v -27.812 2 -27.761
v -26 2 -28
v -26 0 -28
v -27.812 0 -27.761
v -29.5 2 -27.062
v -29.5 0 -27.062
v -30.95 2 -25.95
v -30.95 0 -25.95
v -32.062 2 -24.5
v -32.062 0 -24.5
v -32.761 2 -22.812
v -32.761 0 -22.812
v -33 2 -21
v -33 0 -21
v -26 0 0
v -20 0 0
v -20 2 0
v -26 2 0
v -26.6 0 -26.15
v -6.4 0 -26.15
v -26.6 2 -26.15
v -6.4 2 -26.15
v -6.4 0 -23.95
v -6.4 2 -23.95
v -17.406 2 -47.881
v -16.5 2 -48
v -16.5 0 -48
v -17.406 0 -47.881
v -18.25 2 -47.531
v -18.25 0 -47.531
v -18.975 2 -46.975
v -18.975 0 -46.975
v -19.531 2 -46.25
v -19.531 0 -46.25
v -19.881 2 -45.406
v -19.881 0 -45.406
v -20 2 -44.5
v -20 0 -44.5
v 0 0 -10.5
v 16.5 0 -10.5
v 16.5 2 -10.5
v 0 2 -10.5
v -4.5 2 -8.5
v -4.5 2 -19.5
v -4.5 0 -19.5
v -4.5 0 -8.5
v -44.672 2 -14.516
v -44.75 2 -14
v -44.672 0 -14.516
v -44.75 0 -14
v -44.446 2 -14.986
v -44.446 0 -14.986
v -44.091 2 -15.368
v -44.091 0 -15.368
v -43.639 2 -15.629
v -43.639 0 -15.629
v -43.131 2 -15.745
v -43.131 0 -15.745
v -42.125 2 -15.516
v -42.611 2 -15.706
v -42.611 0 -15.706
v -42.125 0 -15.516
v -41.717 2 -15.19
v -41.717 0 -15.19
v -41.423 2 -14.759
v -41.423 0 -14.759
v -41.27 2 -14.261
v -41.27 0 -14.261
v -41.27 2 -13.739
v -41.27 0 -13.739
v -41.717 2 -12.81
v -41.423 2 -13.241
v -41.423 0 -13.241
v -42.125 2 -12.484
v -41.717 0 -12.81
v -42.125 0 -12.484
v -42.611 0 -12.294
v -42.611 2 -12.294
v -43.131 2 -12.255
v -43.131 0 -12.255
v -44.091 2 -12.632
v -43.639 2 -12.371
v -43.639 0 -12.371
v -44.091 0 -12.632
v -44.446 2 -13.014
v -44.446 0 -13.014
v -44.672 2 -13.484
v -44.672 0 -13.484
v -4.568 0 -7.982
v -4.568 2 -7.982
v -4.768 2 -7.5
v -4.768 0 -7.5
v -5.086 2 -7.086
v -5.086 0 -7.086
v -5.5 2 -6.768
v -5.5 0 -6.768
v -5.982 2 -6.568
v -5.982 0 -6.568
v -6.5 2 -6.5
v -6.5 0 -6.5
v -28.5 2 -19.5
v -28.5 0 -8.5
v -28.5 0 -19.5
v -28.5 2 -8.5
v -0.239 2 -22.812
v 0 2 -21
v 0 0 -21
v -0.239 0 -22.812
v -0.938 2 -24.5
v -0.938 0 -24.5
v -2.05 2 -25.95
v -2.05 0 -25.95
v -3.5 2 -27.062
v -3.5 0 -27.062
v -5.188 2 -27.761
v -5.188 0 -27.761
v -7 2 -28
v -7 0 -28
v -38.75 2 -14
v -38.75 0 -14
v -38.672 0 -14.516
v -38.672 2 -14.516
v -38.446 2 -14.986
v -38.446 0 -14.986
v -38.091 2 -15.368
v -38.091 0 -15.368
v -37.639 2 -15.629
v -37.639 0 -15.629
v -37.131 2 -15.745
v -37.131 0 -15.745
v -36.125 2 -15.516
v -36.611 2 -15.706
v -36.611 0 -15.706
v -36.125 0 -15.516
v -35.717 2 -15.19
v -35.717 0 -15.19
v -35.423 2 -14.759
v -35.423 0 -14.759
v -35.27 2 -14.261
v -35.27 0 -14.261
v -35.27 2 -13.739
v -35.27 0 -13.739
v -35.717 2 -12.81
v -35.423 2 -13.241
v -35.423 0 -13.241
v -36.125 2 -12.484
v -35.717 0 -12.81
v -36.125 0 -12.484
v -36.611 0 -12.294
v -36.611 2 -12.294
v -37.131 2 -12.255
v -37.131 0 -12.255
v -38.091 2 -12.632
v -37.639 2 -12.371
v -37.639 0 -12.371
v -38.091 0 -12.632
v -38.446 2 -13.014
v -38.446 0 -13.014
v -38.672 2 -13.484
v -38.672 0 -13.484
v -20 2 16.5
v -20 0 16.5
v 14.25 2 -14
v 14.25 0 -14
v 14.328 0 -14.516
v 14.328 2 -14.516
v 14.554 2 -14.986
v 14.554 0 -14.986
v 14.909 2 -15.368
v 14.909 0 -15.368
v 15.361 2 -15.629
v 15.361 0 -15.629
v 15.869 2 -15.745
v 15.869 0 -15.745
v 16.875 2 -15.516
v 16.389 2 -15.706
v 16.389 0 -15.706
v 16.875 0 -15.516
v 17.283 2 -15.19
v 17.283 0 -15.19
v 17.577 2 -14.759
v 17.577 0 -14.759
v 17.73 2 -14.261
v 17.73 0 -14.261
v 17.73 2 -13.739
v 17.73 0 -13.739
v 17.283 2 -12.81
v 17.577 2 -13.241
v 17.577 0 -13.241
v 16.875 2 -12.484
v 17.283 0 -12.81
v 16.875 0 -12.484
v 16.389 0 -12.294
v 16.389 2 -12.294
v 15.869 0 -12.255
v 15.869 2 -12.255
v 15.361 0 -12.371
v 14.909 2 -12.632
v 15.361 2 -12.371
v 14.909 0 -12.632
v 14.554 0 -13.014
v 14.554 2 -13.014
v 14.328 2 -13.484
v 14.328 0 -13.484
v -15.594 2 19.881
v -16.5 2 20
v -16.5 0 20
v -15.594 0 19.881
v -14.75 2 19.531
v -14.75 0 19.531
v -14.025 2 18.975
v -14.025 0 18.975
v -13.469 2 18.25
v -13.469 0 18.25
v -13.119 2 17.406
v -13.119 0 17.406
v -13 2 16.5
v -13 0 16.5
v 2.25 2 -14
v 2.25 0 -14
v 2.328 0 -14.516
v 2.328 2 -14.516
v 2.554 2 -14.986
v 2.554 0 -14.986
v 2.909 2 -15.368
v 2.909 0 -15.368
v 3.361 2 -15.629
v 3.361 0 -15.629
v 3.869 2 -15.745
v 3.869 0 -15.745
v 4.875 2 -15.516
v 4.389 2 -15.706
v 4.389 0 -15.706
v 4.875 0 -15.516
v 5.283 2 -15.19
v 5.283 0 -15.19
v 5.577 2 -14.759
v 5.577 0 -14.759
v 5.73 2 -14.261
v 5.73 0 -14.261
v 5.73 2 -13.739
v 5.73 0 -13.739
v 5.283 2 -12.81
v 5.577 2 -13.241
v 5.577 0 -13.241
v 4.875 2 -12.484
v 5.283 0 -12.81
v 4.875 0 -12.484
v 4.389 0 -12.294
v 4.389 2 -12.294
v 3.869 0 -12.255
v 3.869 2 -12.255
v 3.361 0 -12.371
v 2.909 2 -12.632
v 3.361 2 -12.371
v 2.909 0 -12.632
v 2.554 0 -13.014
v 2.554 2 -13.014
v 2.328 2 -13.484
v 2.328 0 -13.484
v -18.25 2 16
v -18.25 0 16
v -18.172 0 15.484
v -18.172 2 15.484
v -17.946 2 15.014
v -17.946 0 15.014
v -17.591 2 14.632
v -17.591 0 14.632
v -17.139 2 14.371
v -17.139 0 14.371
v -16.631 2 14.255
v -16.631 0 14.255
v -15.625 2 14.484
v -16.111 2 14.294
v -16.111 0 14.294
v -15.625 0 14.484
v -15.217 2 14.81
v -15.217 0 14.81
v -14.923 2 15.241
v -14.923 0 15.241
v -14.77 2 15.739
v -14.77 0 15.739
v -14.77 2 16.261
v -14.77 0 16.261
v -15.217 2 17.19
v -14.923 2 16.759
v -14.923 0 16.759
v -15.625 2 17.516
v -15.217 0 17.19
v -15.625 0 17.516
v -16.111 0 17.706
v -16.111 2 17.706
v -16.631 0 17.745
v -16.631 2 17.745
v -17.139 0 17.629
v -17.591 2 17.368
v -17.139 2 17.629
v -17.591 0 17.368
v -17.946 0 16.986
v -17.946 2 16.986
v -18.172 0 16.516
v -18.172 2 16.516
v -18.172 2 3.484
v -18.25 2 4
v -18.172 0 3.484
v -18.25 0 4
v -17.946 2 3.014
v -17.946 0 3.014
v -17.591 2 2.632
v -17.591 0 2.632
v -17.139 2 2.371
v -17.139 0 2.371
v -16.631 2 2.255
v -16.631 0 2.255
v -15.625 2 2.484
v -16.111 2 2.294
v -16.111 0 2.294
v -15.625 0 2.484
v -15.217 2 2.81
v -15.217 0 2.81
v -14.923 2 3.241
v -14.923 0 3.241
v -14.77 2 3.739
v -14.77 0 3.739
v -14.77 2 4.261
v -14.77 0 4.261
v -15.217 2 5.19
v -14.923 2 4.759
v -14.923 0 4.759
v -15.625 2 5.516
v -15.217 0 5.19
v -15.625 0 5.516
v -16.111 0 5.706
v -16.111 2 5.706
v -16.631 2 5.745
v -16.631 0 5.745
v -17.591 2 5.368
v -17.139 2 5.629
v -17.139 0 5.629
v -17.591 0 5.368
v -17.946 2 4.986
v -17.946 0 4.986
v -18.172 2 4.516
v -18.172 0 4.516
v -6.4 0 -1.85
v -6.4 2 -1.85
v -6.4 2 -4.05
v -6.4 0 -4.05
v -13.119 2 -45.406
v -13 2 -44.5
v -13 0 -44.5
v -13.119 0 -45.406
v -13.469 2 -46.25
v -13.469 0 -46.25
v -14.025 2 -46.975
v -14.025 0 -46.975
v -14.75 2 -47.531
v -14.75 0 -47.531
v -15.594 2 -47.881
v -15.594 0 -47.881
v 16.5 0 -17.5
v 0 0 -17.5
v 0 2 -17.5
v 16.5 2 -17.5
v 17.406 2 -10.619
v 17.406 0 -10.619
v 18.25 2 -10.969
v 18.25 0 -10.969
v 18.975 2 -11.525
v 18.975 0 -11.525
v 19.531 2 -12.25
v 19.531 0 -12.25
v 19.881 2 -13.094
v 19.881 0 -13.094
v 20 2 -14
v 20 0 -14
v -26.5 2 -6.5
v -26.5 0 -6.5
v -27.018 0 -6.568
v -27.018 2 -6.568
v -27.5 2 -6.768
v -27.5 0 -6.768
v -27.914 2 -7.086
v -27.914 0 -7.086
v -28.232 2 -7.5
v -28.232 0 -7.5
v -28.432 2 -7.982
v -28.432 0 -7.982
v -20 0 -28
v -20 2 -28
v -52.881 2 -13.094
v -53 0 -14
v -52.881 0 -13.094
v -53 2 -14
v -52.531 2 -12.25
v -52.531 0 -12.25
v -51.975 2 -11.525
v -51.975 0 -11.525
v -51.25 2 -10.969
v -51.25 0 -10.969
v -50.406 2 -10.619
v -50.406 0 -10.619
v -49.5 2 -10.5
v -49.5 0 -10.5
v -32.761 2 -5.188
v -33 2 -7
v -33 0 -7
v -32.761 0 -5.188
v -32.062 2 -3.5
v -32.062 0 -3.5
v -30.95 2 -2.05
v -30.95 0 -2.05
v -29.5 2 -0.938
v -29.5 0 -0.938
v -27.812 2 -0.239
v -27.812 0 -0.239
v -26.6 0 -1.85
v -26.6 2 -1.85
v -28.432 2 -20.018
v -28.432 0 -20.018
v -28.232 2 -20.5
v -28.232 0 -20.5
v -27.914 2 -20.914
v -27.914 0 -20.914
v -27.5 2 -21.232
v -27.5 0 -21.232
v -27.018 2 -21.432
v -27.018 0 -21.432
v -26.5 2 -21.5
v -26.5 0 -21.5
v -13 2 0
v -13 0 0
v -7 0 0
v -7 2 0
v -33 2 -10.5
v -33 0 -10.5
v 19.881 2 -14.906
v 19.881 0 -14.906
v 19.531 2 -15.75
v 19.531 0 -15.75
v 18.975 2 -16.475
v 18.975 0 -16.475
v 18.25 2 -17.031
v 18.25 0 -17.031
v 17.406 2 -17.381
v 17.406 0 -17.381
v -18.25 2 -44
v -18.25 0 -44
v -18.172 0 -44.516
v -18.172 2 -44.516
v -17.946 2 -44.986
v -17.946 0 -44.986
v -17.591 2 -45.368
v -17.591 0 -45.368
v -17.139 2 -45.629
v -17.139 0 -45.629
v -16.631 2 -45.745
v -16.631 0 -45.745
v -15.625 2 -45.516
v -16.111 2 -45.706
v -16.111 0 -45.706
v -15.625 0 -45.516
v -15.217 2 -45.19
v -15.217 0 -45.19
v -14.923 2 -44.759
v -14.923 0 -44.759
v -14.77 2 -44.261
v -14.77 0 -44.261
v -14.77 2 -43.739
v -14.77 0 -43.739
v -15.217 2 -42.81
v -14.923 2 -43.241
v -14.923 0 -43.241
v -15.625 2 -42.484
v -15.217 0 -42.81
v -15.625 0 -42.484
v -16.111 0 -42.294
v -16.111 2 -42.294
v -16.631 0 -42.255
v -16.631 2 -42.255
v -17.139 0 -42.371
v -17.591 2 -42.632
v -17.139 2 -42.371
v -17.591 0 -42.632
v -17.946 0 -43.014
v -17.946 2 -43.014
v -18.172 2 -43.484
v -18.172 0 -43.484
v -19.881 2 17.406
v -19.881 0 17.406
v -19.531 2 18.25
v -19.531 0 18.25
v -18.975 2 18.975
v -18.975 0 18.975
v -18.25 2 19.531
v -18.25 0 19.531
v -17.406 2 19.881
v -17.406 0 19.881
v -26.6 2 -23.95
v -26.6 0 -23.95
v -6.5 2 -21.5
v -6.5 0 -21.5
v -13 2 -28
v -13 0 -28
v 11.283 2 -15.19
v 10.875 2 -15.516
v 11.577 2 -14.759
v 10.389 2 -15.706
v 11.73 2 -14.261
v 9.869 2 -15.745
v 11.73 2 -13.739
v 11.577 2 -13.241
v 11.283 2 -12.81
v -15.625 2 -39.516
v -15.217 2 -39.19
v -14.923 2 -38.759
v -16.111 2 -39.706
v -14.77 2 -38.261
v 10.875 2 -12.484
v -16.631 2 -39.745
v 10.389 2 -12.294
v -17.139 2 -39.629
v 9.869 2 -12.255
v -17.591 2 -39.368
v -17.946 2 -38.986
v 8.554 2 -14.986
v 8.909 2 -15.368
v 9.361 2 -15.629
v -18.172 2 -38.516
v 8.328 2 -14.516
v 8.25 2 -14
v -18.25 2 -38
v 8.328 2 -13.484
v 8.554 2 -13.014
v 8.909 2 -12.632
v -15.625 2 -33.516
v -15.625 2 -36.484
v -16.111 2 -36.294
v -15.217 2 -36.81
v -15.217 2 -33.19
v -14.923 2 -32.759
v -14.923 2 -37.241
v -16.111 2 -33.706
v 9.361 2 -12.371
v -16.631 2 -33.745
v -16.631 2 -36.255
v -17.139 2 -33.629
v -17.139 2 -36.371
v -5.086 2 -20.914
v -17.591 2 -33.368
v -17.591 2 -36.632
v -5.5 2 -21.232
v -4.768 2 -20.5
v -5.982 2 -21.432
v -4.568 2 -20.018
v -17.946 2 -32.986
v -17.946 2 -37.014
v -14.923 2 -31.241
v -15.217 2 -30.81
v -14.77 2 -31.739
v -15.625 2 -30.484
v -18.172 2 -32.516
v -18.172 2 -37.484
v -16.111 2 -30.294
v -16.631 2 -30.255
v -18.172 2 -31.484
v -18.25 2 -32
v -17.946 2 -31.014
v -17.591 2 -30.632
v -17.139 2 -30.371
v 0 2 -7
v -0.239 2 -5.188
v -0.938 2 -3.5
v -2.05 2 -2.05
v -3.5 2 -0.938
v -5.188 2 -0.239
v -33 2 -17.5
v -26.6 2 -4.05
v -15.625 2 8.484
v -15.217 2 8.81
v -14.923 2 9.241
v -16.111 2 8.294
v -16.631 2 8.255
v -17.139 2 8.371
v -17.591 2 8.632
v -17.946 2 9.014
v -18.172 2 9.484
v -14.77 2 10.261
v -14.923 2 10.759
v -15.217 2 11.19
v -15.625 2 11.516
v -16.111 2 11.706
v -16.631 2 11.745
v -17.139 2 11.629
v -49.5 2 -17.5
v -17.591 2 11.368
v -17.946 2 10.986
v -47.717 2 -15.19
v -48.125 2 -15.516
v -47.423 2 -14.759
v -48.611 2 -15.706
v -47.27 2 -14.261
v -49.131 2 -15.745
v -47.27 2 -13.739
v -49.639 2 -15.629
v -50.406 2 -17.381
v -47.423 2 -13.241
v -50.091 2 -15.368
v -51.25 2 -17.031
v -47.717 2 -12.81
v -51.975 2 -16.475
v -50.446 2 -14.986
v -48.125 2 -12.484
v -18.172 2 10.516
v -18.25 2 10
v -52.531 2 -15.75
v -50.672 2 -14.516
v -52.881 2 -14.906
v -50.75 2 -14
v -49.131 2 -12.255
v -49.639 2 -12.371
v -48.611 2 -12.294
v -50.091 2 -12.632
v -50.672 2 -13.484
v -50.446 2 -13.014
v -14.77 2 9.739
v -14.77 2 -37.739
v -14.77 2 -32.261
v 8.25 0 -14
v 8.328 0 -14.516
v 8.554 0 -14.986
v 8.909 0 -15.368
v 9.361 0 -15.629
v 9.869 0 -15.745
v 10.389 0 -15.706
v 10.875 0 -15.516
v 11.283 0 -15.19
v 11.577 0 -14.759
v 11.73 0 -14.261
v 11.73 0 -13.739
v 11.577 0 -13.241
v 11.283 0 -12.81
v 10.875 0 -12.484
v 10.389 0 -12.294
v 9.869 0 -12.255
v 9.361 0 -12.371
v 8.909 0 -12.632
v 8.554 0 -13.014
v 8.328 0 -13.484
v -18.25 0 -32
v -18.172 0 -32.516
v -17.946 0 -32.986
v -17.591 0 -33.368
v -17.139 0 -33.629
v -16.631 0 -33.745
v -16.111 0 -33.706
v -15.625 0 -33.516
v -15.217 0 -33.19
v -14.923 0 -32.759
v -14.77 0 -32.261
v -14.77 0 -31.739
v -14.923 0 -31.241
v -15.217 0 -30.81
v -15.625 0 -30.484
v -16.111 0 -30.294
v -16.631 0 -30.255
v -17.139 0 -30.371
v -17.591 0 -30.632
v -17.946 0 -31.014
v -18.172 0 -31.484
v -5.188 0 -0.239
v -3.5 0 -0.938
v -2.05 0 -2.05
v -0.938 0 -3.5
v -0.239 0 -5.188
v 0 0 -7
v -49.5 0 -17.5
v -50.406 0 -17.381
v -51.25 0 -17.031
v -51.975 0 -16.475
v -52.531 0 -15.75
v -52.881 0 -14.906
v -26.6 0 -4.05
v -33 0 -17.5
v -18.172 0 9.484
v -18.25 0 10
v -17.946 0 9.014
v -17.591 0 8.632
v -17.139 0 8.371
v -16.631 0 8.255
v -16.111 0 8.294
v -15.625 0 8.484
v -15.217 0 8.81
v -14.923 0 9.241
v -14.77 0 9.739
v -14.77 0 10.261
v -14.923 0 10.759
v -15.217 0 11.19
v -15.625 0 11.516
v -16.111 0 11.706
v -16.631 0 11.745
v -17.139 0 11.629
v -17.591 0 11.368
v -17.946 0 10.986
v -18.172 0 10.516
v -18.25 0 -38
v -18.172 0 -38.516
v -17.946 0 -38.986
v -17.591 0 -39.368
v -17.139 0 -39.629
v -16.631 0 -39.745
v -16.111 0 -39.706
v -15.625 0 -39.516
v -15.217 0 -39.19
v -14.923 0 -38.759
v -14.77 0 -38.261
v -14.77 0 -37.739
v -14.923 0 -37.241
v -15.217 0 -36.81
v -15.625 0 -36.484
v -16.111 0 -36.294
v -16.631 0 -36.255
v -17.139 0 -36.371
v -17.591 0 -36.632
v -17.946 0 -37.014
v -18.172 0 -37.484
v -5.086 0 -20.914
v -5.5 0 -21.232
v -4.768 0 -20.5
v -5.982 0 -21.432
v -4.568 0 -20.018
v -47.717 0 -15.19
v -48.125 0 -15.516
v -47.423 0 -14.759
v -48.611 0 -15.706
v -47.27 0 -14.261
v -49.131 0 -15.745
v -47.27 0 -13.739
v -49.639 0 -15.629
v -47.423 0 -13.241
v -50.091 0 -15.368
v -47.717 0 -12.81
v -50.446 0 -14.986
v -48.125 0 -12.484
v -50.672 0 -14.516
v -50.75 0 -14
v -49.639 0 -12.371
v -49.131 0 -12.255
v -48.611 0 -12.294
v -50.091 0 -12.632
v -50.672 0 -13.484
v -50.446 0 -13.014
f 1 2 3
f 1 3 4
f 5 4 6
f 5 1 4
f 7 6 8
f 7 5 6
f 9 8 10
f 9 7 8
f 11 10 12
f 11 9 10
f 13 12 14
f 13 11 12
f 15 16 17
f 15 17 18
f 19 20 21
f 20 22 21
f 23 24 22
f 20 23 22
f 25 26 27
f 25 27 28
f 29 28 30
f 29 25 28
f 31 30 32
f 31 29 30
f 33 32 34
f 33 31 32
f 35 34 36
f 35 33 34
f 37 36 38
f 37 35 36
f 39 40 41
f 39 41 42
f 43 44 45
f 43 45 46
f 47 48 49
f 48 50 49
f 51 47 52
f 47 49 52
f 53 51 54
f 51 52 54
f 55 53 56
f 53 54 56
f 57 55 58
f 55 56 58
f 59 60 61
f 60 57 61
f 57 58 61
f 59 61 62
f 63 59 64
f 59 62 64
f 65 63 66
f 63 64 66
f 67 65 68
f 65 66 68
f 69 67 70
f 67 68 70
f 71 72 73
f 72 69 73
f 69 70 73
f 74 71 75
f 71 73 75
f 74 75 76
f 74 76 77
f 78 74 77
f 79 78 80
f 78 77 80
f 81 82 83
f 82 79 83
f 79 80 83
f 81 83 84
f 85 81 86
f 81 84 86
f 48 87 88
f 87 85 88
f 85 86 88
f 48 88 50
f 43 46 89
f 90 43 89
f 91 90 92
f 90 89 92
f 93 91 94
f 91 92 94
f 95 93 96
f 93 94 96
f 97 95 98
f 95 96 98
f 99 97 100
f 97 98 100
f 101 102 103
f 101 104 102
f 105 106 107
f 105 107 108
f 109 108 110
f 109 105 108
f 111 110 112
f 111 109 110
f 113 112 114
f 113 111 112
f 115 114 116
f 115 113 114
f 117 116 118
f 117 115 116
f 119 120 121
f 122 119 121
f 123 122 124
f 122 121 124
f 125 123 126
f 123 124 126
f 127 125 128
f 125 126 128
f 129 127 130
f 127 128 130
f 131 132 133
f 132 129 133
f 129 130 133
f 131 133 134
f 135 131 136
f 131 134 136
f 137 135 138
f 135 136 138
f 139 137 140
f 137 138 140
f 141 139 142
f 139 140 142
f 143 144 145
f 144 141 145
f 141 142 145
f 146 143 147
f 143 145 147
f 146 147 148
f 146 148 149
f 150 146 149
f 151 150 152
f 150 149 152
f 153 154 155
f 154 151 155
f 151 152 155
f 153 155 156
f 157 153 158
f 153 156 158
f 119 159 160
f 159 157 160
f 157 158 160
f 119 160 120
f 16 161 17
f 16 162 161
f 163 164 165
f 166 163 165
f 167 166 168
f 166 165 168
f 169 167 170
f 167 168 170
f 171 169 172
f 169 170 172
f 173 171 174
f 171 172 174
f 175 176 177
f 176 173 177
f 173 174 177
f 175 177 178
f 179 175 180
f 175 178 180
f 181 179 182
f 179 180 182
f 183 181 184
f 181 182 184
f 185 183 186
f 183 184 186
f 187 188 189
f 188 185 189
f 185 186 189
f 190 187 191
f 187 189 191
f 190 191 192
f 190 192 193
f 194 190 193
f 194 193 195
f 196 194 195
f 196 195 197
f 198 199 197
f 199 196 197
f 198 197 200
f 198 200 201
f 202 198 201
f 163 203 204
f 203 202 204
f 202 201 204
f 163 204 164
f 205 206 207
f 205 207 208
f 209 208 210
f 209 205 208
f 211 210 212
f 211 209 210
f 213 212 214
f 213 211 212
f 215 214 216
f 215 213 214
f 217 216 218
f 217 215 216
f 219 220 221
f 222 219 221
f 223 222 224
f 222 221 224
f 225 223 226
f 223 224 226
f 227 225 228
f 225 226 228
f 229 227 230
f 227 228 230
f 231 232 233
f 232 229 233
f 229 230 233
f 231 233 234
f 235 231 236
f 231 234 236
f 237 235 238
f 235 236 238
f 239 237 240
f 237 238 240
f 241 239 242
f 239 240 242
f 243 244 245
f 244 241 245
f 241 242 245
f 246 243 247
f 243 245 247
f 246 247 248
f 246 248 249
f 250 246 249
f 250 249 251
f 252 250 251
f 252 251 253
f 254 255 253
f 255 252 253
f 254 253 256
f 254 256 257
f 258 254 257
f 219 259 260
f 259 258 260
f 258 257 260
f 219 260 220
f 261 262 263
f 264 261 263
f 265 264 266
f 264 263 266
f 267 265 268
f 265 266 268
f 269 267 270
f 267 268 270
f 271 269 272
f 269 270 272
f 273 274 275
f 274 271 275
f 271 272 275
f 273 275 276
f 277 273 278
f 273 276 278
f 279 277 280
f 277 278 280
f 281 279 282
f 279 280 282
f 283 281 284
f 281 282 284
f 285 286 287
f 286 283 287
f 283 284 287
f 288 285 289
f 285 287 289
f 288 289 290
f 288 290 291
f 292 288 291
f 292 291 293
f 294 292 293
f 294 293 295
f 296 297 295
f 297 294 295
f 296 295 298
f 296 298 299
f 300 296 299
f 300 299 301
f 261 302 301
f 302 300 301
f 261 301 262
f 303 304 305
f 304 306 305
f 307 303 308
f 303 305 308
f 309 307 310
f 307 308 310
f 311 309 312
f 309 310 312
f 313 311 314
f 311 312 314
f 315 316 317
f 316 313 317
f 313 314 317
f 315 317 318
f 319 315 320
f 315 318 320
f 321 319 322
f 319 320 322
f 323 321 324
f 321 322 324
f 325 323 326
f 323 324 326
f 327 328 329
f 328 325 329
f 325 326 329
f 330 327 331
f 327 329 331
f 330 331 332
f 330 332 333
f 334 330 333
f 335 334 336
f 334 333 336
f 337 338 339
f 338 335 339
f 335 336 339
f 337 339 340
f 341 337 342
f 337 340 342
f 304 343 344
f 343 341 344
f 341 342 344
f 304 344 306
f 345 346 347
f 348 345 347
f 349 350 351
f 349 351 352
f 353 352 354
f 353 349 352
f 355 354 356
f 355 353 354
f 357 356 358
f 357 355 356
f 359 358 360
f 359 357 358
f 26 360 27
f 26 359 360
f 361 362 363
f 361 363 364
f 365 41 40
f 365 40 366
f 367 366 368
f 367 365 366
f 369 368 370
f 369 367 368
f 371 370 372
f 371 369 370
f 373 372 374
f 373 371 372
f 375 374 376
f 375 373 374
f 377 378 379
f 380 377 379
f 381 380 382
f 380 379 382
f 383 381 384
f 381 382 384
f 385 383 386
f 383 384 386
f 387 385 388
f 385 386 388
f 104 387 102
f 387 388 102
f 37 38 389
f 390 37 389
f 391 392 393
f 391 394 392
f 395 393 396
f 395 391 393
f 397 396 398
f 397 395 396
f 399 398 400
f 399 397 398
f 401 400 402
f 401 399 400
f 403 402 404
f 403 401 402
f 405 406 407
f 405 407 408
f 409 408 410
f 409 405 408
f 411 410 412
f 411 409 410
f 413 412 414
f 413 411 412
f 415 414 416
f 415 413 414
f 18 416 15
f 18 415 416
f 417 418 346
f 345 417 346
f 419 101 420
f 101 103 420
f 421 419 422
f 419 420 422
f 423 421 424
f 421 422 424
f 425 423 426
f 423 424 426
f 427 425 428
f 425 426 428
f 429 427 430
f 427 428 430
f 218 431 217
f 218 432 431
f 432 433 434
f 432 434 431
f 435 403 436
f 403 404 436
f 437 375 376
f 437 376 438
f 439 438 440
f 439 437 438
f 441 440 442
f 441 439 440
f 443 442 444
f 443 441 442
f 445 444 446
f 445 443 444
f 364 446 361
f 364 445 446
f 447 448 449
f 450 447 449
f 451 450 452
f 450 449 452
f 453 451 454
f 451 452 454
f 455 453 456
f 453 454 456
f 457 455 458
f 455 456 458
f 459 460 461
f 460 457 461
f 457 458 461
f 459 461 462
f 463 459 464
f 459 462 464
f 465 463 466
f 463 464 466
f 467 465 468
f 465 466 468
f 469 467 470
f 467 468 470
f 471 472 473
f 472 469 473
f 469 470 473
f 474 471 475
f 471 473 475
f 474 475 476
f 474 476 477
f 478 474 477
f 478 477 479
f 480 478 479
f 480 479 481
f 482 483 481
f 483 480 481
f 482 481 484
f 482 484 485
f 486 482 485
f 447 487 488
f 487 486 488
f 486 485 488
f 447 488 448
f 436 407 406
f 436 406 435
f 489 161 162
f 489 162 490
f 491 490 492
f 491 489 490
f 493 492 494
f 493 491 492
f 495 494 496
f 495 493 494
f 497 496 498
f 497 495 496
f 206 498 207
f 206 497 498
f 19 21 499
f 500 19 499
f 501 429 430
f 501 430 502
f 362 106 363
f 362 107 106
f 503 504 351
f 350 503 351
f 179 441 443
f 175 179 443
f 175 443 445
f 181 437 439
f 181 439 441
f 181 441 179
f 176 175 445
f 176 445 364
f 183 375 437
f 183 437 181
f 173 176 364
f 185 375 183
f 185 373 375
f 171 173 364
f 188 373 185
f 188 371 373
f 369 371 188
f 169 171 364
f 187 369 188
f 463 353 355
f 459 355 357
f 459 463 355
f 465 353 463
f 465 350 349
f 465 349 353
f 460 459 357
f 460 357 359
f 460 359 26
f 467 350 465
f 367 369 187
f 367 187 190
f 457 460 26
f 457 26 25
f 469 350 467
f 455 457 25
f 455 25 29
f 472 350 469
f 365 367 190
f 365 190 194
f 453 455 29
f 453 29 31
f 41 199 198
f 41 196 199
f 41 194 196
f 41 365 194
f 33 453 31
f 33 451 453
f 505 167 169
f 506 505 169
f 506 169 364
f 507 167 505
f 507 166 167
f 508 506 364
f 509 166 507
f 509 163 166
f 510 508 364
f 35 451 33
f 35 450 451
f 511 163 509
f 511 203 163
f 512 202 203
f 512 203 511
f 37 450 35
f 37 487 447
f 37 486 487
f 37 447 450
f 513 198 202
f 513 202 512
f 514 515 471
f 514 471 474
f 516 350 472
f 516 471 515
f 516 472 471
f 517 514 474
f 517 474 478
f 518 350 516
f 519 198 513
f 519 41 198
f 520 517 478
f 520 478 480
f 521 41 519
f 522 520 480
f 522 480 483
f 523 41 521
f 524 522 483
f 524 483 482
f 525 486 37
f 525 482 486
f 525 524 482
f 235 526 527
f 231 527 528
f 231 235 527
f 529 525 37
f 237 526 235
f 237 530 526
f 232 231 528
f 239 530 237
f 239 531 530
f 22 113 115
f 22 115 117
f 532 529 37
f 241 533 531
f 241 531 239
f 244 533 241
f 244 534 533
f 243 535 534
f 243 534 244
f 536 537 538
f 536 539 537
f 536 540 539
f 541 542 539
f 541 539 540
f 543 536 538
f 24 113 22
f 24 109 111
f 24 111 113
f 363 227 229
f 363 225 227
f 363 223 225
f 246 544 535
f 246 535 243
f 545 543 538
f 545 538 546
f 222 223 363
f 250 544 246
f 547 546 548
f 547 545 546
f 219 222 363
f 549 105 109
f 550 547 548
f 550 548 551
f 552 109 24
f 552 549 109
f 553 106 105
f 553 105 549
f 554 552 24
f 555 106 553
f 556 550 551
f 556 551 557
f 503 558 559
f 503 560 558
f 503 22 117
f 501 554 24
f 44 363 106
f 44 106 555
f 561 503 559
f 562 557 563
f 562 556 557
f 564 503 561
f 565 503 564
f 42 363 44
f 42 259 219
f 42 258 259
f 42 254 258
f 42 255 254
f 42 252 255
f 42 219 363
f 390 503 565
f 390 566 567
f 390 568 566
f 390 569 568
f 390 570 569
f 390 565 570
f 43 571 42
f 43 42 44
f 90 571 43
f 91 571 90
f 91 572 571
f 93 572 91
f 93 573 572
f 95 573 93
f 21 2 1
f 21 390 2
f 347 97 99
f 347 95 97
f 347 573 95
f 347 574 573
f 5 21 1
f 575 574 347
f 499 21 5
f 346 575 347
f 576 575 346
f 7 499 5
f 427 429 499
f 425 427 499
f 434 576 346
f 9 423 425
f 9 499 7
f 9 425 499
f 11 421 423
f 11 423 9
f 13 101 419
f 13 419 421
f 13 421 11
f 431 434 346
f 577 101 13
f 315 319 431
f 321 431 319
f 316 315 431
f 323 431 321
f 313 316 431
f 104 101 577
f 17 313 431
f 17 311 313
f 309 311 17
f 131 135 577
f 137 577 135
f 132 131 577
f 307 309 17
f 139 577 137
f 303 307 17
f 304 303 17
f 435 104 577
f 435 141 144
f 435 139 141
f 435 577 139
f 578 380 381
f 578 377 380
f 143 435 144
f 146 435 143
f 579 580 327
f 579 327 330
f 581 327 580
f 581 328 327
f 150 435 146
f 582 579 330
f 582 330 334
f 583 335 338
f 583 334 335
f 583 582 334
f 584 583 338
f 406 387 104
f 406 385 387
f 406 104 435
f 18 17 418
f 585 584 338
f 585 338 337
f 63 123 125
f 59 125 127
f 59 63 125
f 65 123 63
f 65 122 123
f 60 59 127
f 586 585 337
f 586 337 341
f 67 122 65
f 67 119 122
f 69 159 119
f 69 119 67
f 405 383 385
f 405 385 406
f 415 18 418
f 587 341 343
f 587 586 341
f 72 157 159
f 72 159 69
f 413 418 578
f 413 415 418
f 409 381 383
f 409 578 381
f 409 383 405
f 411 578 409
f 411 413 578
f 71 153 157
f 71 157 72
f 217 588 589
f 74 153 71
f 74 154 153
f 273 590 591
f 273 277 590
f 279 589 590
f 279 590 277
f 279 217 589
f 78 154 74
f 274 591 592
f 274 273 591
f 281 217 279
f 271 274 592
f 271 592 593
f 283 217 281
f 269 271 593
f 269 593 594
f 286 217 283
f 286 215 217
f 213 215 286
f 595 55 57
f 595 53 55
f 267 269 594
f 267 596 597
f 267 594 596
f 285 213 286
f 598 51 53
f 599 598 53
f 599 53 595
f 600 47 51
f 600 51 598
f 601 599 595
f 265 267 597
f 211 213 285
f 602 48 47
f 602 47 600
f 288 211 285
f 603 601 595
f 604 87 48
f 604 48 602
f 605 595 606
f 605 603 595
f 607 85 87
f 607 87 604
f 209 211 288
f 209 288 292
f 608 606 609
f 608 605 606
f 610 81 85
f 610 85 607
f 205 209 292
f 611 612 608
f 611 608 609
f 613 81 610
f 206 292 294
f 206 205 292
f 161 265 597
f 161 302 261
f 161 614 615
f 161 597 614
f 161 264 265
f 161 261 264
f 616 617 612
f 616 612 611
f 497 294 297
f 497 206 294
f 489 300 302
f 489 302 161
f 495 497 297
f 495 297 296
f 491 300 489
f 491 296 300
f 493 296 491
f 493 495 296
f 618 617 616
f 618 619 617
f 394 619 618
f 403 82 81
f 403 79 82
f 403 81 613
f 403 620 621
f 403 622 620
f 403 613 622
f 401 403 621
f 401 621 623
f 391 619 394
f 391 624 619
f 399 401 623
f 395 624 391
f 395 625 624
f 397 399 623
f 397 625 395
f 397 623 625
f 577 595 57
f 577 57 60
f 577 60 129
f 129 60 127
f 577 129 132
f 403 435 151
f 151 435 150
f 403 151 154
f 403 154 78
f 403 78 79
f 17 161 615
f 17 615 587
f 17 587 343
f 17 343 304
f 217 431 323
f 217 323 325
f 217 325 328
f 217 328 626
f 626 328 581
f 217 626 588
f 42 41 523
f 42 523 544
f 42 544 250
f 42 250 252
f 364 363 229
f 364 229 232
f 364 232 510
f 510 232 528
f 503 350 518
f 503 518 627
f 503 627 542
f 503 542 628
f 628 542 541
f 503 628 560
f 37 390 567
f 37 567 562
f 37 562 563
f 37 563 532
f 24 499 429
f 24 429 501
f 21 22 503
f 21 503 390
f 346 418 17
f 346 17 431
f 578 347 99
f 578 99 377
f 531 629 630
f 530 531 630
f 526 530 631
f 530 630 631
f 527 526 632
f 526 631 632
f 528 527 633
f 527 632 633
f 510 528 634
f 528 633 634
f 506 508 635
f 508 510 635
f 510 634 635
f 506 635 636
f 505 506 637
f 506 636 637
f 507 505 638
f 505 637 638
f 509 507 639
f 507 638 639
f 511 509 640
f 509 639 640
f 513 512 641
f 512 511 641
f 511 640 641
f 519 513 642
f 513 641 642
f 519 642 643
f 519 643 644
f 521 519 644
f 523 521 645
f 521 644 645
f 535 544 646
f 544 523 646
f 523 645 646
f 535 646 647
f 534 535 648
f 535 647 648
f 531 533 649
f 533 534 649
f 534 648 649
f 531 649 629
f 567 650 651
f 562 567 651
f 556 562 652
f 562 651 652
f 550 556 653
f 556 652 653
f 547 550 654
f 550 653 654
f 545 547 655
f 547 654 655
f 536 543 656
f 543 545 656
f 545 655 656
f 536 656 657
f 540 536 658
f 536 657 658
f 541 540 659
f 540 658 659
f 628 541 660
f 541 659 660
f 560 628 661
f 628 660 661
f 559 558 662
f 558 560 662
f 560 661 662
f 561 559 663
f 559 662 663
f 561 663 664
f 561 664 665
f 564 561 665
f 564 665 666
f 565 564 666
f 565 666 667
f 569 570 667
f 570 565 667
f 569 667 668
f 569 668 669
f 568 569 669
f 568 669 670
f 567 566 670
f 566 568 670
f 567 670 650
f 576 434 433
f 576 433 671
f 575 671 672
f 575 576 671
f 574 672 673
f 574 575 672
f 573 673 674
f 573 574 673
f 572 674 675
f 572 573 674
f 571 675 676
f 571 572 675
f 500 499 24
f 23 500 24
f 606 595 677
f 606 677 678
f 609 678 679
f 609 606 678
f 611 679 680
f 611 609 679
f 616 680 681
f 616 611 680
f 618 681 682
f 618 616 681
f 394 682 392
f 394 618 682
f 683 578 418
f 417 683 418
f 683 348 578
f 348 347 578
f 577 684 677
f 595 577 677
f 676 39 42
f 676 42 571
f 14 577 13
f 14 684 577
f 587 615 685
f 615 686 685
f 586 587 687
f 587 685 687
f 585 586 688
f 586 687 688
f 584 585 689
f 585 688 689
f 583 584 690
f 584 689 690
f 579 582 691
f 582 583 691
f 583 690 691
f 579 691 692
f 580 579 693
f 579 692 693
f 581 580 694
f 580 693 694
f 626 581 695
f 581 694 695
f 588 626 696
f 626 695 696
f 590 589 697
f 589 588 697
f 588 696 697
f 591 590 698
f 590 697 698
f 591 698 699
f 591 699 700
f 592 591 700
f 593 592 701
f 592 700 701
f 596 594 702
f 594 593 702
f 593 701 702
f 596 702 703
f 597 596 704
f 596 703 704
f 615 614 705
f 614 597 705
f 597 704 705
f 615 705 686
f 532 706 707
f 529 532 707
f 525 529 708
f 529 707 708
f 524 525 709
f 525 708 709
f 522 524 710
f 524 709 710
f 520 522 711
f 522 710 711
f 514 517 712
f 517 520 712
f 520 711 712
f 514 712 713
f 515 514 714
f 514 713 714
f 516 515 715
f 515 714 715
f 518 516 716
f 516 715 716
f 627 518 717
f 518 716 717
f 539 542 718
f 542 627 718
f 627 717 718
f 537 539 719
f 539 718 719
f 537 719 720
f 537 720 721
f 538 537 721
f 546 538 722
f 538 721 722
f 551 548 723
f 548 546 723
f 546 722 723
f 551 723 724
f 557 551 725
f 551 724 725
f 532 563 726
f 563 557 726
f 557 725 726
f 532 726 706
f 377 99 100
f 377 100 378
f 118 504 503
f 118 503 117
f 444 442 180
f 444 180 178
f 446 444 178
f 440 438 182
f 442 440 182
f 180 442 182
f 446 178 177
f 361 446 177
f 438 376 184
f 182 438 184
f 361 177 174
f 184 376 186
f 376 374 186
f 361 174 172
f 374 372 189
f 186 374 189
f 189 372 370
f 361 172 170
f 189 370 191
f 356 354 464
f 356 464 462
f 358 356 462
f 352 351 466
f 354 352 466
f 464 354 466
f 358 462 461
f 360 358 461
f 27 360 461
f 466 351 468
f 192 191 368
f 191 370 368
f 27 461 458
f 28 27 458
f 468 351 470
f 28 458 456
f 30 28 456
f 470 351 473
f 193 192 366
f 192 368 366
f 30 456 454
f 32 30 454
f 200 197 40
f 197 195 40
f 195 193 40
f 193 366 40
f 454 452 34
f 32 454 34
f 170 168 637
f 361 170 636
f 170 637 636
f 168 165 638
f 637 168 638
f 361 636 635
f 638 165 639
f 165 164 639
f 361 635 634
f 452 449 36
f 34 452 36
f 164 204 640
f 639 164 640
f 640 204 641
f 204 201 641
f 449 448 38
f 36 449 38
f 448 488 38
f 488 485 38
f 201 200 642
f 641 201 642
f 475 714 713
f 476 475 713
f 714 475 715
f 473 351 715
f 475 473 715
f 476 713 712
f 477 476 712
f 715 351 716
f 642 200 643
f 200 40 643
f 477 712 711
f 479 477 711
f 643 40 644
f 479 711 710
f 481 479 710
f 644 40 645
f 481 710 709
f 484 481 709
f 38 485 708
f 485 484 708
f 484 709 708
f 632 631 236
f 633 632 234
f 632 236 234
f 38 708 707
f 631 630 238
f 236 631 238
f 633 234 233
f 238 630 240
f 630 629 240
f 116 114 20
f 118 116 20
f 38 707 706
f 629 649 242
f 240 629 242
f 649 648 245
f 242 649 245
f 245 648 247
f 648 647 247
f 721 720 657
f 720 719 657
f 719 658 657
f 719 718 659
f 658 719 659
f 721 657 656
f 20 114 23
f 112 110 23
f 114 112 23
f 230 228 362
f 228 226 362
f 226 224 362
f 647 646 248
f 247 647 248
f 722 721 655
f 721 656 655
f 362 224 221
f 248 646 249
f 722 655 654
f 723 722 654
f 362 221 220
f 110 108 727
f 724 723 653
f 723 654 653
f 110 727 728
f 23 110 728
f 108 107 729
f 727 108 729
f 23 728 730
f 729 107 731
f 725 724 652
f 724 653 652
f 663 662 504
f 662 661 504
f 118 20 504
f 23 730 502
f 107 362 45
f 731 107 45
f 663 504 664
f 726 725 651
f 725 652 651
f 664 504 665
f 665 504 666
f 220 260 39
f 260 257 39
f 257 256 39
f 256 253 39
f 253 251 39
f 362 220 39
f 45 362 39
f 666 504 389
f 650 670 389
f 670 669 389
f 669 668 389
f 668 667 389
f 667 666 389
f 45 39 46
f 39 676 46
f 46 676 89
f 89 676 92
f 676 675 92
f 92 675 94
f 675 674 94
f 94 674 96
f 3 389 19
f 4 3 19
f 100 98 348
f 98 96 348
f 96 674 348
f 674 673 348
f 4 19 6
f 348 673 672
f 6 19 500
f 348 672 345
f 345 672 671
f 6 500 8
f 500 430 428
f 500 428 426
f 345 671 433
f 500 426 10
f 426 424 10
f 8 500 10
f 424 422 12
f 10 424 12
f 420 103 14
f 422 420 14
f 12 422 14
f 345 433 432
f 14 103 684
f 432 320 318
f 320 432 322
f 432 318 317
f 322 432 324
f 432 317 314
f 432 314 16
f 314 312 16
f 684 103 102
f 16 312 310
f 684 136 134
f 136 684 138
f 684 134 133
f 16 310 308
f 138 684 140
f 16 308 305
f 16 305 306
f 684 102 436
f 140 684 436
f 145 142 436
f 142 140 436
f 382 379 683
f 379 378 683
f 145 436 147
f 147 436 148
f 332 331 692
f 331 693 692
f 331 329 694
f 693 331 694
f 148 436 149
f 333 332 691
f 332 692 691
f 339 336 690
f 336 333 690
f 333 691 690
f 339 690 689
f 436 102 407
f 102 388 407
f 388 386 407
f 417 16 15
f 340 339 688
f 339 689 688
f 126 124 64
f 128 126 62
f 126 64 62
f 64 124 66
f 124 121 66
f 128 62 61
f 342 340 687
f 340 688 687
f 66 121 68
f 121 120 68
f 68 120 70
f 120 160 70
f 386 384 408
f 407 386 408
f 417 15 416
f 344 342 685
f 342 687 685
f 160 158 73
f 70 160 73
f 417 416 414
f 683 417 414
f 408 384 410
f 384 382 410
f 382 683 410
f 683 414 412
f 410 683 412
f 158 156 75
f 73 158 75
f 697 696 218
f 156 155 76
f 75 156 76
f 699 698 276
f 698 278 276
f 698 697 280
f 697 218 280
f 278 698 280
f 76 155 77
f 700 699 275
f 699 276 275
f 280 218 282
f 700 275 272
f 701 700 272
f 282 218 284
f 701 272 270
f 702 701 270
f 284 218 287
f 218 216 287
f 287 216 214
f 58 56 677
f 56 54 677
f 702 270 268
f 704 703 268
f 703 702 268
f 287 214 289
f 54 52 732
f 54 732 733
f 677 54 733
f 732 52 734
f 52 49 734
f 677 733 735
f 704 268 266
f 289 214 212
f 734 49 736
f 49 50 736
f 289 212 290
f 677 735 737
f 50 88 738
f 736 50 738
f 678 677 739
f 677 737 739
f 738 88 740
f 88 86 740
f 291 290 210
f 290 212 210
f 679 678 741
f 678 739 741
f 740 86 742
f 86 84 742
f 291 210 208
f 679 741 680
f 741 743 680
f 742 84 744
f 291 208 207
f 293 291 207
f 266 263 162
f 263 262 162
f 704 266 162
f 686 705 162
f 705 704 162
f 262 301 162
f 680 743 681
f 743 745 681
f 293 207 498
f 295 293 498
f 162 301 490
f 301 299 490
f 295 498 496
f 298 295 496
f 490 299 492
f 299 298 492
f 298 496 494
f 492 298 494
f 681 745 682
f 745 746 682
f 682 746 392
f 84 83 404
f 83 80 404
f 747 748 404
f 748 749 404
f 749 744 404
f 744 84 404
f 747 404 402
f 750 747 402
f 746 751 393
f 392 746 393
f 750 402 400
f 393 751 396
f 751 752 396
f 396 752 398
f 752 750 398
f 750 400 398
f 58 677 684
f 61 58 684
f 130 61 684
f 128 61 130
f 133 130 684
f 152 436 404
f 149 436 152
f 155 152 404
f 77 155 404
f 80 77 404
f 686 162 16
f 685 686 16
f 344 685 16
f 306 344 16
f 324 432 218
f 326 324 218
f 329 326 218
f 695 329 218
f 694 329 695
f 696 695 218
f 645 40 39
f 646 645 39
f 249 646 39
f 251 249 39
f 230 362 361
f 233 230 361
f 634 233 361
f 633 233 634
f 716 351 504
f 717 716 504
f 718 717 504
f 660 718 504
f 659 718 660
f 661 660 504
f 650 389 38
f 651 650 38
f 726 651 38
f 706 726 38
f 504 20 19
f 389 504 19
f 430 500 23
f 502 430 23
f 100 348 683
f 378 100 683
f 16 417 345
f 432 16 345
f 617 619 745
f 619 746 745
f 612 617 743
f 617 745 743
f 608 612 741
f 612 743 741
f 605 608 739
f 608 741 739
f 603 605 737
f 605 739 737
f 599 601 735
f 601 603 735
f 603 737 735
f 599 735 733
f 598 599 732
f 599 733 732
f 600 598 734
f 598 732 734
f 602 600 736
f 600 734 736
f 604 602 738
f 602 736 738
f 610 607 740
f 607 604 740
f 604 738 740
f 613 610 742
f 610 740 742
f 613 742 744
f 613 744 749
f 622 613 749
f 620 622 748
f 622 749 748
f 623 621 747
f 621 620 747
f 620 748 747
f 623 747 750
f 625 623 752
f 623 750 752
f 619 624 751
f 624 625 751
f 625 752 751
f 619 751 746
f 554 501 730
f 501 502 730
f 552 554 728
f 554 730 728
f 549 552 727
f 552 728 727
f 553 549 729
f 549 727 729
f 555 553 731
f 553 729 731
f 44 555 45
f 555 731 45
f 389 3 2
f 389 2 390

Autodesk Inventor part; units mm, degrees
ref_plane "YZ Plane" through (0, 0, 0) normal (1, 0, 0) x (0, 1, 0)
ref_plane "XZ Plane" through (0, 0, 0) normal (0, 1, 0) x (-1, 0, 0)
ref_plane "XY Plane" through (0, 0, 0) normal (0, 0, 1) x (1, 0, 0)
sketch "Sketch1" plane through (0, 0, 0) normal (0, 1, 0) x (-1, 0, 0)
  line L0 (0, 0) -> (33, 0)
  line L1 (33, 0) -> (33, -28)
  line L2 (33, -28) -> (0, -28)
  line L3 (0, -28) -> (0, 0)
  line L4 (0, -17.5) -> (-20, -17.5)
  line L5 (-20, -17.5) -> (-20, -10.5)
  line L6 (-20, -10.5) -> (0, -10.5)
  line L7 (0, -10.5) -> (0, -17.5)
  line L8 (33, -17.5) -> (53, -17.5)
  line L9 (53, -17.5) -> (53, -10.5)
  line L10 (53, -10.5) -> (33, -10.5)
  line L11 (33, -10.5) -> (33, -17.5)
  line L12 (20, -28) -> (13, -28)
  line L13 (13, -28) -> (13, -48)
  line L14 (13, -48) -> (20, -48)
  line L15 (20, -48) -> (20, -28)
  line L16 (20, 0) -> (13, 0)
  line L17 (13, 0) -> (13, 20)
  line L18 (13, 20) -> (20, 20)
  line L19 (20, 20) -> (20, 0)
  circle A0 centre (16.5, -44) radius 1.75
  circle A1 centre (-16, -14) radius 1.75
  circle A2 centre (16.5, 16) radius 1.75
  circle A3 centre (49, -14) radius 1.75
  line L20 (16.5, -44) -> (16.5, -48) construction
  line L21 (-16, -14) -> (-20, -14) construction
  line L22 (16.5, 16) -> (16.5, 20) construction
  line L23 (49, -14) -> (53, -14) construction
  circle A4 centre (43, -14) radius 1.75
  circle A5 centre (37, -14) radius 1.75
  circle A6 centre (16.5, -38) radius 1.75
  circle A7 centre (16.5, -32) radius 1.75
  circle A8 centre (-10, -14) radius 1.75
  circle A9 centre (-4, -14) radius 1.75
  circle A10 centre (16.5, 10) radius 1.75
  circle A11 centre (16.5, 4) radius 1.75
  point P0 (16.5, -28)
  point P1 (16.5, 0)
  point P2 (0, -14)
  point P3 (33, -14)
  dimension "d0" = 33
  dimension "d1" = 28
  dimension "d29" = 7
  dimension "d34" = 20
  dimension "d35" = 4
  dimension "d36" = 3.5
  dimension "d44" = 6
  dimension "d51" = 6
  dimension "d58" = 6
  dimension "d65" = 6
extrude "Extrusion1" add sketch "Sketch1" along normal blind 2
sketch "Sketch2" plane through (0, 2, 0) normal (0, 1, 0) x (1, 0, 0)
  line L0 (0, 28) -> (-13, 28) projected
  line L1 (-33, 28) -> (-33, 17.5) projected
  line L2 (-33, 0) -> (-20, 0) projected
  line L3 (0, 0) -> (0, 10.5) projected
  line L4 (-26.6, 1.85) -> (-6.4, 1.85)
  line L5 (-6.4, 1.85) -> (-6.4, 4.05)
  line L6 (-6.4, 4.05) -> (-26.6, 4.05)
  line L7 (-26.6, 4.05) -> (-26.6, 1.85)
  line L8 (-26.6, 23.95) -> (-6.4, 23.95)
  line L9 (-6.4, 23.95) -> (-6.4, 26.15)
  line L10 (-6.4, 26.15) -> (-26.6, 26.15)
  line L11 (-26.6, 26.15) -> (-26.6, 23.95)
  line L12 (-26.6, 1.85) -> (-33, 1.85)
  line L13 (-26.6, 1.85) -> (-26.6, 0)
  line L14 (-26.6, 26.15) -> (-26.6, 28)
  line L15 (-6.4, 4.05) -> (0, 4.05)
  line L16 (-13, 28) -> (-13, 48) projected
  line L17 (-13, 48) -> (-20, 48) projected
  line L18 (-20, 48) -> (-20, 28) projected
  line L19 (-20, 28) -> (-33, 28) projected
  line L20 (-33, 17.5) -> (-53, 17.5) projected
  line L21 (-53, 17.5) -> (-53, 10.5) projected
  line L22 (-53, 10.5) -> (-33, 10.5) projected
  line L23 (-33, 10.5) -> (-33, 0) projected
  line L24 (-20, 0) -> (-20, -20) projected
  line L25 (-20, -20) -> (-13, -20) projected
  line L26 (-13, -20) -> (-13, 0) projected
  line L27 (-13, 0) -> (0, 0) projected
  line L28 (0, 10.5) -> (20, 10.5) projected
  line L29 (20, 10.5) -> (20, 17.5) projected
  line L30 (20, 17.5) -> (0, 17.5) projected
  line L31 (0, 17.5) -> (0, 28) projected
  line L32 (-28.5, 21.5) -> (-4.5, 21.5)
  line L33 (-4.5, 21.5) -> (-4.5, 6.5)
  line L34 (-4.5, 6.5) -> (-28.5, 6.5)
  line L35 (-28.5, 6.5) -> (-28.5, 21.5)
  line L36 (-28.5, 21.5) -> (-4.5, 6.5) construction
  line L37 (-4.5, 21.5) -> (-28.5, 6.5) construction
  point P0 (-16.5, 14)
  point P1 (-16.5, 23.95)
  point P2 (20, 14)
  dimension "d4" = 2.2
  dimension "d5" = 20.2
  dimension "d6" = 19.9
  dimension "d37" = 24
  dimension "d38" = 15
extrude "Extrusion2" cut sketch "Sketch2" against normal through all contours L10 L9 L8 L11 | L5 L4 L7 L6 | L32 L33 L34 L35
fillet "Fillet1" radius 3.5 8 edges at (-20, 1, 20) (-13, 1, 20) (20, 1, -10.5) (20, 1, -17.5) (-13, 1, -48) (-20, 1, -48) (-53, 1, -17.5) (-53, 1, -10.5)
fillet "Fillet2" radius 7 4 edges at (-33, 1, 0) (-33, 1, -28) (0, 1, -28) (0, 1, 0)
fillet "Fillet3" radius 2 4 edges at (-28.5, 1, -21.5) (-4.5, 1, -21.5) (-28.5, 1, -6.5) (-4.5, 1, -6.5)
sketch "Sketch4" plane through (0, 2, 0) normal (0, 1, 0) x (1, 0, 0)
  arc A0 (-4.5, 19.5) -> (-6.5, 21.5) centre (-6.5, 19.5) ccw construction
  line L0 (-26.5, 21.5) -> (-6.5, 21.5) construction
  line L1 (-4.5, 19.5) -> (-4.5, 8.5) construction
  arc A1 (-6.5, 6.5) -> (-4.5, 8.5) centre (-6.5, 8.5) ccw construction
  line L2 (-6.5, 6.5) -> (-26.5, 6.5) construction
  arc A2 (-28.5, 8.5) -> (-26.5, 6.5) centre (-26.5, 8.5) ccw construction
  line L3 (-28.5, 8.5) -> (-28.5, 19.5) construction
  arc A3 (-26.5, 21.5) -> (-28.5, 19.5) centre (-26.5, 19.5) ccw construction
  line L4 (-25.5, 21.5) -> (-23.5, 21.5)
  line L5 (-23.5, 21.5) -> (-23.5, 6.5)
  line L6 (-23.5, 6.5) -> (-25.5, 6.5)
  line L7 (-25.5, 6.5) -> (-25.5, 21.5)
  line L8 (-9.5, 6.5) -> (-7.5, 6.5)
  line L9 (-7.5, 6.5) -> (-7.5, 21.5)
  line L10 (-7.5, 21.5) -> (-9.5, 21.5)
  line L11 (-9.5, 21.5) -> (-9.5, 6.5)
  point P0 (0, 0)
  dimension "d70" = 3
  dimension "d71" = 3
  dimension "d72" = 2
properties part number "SoporteMarkers12"
